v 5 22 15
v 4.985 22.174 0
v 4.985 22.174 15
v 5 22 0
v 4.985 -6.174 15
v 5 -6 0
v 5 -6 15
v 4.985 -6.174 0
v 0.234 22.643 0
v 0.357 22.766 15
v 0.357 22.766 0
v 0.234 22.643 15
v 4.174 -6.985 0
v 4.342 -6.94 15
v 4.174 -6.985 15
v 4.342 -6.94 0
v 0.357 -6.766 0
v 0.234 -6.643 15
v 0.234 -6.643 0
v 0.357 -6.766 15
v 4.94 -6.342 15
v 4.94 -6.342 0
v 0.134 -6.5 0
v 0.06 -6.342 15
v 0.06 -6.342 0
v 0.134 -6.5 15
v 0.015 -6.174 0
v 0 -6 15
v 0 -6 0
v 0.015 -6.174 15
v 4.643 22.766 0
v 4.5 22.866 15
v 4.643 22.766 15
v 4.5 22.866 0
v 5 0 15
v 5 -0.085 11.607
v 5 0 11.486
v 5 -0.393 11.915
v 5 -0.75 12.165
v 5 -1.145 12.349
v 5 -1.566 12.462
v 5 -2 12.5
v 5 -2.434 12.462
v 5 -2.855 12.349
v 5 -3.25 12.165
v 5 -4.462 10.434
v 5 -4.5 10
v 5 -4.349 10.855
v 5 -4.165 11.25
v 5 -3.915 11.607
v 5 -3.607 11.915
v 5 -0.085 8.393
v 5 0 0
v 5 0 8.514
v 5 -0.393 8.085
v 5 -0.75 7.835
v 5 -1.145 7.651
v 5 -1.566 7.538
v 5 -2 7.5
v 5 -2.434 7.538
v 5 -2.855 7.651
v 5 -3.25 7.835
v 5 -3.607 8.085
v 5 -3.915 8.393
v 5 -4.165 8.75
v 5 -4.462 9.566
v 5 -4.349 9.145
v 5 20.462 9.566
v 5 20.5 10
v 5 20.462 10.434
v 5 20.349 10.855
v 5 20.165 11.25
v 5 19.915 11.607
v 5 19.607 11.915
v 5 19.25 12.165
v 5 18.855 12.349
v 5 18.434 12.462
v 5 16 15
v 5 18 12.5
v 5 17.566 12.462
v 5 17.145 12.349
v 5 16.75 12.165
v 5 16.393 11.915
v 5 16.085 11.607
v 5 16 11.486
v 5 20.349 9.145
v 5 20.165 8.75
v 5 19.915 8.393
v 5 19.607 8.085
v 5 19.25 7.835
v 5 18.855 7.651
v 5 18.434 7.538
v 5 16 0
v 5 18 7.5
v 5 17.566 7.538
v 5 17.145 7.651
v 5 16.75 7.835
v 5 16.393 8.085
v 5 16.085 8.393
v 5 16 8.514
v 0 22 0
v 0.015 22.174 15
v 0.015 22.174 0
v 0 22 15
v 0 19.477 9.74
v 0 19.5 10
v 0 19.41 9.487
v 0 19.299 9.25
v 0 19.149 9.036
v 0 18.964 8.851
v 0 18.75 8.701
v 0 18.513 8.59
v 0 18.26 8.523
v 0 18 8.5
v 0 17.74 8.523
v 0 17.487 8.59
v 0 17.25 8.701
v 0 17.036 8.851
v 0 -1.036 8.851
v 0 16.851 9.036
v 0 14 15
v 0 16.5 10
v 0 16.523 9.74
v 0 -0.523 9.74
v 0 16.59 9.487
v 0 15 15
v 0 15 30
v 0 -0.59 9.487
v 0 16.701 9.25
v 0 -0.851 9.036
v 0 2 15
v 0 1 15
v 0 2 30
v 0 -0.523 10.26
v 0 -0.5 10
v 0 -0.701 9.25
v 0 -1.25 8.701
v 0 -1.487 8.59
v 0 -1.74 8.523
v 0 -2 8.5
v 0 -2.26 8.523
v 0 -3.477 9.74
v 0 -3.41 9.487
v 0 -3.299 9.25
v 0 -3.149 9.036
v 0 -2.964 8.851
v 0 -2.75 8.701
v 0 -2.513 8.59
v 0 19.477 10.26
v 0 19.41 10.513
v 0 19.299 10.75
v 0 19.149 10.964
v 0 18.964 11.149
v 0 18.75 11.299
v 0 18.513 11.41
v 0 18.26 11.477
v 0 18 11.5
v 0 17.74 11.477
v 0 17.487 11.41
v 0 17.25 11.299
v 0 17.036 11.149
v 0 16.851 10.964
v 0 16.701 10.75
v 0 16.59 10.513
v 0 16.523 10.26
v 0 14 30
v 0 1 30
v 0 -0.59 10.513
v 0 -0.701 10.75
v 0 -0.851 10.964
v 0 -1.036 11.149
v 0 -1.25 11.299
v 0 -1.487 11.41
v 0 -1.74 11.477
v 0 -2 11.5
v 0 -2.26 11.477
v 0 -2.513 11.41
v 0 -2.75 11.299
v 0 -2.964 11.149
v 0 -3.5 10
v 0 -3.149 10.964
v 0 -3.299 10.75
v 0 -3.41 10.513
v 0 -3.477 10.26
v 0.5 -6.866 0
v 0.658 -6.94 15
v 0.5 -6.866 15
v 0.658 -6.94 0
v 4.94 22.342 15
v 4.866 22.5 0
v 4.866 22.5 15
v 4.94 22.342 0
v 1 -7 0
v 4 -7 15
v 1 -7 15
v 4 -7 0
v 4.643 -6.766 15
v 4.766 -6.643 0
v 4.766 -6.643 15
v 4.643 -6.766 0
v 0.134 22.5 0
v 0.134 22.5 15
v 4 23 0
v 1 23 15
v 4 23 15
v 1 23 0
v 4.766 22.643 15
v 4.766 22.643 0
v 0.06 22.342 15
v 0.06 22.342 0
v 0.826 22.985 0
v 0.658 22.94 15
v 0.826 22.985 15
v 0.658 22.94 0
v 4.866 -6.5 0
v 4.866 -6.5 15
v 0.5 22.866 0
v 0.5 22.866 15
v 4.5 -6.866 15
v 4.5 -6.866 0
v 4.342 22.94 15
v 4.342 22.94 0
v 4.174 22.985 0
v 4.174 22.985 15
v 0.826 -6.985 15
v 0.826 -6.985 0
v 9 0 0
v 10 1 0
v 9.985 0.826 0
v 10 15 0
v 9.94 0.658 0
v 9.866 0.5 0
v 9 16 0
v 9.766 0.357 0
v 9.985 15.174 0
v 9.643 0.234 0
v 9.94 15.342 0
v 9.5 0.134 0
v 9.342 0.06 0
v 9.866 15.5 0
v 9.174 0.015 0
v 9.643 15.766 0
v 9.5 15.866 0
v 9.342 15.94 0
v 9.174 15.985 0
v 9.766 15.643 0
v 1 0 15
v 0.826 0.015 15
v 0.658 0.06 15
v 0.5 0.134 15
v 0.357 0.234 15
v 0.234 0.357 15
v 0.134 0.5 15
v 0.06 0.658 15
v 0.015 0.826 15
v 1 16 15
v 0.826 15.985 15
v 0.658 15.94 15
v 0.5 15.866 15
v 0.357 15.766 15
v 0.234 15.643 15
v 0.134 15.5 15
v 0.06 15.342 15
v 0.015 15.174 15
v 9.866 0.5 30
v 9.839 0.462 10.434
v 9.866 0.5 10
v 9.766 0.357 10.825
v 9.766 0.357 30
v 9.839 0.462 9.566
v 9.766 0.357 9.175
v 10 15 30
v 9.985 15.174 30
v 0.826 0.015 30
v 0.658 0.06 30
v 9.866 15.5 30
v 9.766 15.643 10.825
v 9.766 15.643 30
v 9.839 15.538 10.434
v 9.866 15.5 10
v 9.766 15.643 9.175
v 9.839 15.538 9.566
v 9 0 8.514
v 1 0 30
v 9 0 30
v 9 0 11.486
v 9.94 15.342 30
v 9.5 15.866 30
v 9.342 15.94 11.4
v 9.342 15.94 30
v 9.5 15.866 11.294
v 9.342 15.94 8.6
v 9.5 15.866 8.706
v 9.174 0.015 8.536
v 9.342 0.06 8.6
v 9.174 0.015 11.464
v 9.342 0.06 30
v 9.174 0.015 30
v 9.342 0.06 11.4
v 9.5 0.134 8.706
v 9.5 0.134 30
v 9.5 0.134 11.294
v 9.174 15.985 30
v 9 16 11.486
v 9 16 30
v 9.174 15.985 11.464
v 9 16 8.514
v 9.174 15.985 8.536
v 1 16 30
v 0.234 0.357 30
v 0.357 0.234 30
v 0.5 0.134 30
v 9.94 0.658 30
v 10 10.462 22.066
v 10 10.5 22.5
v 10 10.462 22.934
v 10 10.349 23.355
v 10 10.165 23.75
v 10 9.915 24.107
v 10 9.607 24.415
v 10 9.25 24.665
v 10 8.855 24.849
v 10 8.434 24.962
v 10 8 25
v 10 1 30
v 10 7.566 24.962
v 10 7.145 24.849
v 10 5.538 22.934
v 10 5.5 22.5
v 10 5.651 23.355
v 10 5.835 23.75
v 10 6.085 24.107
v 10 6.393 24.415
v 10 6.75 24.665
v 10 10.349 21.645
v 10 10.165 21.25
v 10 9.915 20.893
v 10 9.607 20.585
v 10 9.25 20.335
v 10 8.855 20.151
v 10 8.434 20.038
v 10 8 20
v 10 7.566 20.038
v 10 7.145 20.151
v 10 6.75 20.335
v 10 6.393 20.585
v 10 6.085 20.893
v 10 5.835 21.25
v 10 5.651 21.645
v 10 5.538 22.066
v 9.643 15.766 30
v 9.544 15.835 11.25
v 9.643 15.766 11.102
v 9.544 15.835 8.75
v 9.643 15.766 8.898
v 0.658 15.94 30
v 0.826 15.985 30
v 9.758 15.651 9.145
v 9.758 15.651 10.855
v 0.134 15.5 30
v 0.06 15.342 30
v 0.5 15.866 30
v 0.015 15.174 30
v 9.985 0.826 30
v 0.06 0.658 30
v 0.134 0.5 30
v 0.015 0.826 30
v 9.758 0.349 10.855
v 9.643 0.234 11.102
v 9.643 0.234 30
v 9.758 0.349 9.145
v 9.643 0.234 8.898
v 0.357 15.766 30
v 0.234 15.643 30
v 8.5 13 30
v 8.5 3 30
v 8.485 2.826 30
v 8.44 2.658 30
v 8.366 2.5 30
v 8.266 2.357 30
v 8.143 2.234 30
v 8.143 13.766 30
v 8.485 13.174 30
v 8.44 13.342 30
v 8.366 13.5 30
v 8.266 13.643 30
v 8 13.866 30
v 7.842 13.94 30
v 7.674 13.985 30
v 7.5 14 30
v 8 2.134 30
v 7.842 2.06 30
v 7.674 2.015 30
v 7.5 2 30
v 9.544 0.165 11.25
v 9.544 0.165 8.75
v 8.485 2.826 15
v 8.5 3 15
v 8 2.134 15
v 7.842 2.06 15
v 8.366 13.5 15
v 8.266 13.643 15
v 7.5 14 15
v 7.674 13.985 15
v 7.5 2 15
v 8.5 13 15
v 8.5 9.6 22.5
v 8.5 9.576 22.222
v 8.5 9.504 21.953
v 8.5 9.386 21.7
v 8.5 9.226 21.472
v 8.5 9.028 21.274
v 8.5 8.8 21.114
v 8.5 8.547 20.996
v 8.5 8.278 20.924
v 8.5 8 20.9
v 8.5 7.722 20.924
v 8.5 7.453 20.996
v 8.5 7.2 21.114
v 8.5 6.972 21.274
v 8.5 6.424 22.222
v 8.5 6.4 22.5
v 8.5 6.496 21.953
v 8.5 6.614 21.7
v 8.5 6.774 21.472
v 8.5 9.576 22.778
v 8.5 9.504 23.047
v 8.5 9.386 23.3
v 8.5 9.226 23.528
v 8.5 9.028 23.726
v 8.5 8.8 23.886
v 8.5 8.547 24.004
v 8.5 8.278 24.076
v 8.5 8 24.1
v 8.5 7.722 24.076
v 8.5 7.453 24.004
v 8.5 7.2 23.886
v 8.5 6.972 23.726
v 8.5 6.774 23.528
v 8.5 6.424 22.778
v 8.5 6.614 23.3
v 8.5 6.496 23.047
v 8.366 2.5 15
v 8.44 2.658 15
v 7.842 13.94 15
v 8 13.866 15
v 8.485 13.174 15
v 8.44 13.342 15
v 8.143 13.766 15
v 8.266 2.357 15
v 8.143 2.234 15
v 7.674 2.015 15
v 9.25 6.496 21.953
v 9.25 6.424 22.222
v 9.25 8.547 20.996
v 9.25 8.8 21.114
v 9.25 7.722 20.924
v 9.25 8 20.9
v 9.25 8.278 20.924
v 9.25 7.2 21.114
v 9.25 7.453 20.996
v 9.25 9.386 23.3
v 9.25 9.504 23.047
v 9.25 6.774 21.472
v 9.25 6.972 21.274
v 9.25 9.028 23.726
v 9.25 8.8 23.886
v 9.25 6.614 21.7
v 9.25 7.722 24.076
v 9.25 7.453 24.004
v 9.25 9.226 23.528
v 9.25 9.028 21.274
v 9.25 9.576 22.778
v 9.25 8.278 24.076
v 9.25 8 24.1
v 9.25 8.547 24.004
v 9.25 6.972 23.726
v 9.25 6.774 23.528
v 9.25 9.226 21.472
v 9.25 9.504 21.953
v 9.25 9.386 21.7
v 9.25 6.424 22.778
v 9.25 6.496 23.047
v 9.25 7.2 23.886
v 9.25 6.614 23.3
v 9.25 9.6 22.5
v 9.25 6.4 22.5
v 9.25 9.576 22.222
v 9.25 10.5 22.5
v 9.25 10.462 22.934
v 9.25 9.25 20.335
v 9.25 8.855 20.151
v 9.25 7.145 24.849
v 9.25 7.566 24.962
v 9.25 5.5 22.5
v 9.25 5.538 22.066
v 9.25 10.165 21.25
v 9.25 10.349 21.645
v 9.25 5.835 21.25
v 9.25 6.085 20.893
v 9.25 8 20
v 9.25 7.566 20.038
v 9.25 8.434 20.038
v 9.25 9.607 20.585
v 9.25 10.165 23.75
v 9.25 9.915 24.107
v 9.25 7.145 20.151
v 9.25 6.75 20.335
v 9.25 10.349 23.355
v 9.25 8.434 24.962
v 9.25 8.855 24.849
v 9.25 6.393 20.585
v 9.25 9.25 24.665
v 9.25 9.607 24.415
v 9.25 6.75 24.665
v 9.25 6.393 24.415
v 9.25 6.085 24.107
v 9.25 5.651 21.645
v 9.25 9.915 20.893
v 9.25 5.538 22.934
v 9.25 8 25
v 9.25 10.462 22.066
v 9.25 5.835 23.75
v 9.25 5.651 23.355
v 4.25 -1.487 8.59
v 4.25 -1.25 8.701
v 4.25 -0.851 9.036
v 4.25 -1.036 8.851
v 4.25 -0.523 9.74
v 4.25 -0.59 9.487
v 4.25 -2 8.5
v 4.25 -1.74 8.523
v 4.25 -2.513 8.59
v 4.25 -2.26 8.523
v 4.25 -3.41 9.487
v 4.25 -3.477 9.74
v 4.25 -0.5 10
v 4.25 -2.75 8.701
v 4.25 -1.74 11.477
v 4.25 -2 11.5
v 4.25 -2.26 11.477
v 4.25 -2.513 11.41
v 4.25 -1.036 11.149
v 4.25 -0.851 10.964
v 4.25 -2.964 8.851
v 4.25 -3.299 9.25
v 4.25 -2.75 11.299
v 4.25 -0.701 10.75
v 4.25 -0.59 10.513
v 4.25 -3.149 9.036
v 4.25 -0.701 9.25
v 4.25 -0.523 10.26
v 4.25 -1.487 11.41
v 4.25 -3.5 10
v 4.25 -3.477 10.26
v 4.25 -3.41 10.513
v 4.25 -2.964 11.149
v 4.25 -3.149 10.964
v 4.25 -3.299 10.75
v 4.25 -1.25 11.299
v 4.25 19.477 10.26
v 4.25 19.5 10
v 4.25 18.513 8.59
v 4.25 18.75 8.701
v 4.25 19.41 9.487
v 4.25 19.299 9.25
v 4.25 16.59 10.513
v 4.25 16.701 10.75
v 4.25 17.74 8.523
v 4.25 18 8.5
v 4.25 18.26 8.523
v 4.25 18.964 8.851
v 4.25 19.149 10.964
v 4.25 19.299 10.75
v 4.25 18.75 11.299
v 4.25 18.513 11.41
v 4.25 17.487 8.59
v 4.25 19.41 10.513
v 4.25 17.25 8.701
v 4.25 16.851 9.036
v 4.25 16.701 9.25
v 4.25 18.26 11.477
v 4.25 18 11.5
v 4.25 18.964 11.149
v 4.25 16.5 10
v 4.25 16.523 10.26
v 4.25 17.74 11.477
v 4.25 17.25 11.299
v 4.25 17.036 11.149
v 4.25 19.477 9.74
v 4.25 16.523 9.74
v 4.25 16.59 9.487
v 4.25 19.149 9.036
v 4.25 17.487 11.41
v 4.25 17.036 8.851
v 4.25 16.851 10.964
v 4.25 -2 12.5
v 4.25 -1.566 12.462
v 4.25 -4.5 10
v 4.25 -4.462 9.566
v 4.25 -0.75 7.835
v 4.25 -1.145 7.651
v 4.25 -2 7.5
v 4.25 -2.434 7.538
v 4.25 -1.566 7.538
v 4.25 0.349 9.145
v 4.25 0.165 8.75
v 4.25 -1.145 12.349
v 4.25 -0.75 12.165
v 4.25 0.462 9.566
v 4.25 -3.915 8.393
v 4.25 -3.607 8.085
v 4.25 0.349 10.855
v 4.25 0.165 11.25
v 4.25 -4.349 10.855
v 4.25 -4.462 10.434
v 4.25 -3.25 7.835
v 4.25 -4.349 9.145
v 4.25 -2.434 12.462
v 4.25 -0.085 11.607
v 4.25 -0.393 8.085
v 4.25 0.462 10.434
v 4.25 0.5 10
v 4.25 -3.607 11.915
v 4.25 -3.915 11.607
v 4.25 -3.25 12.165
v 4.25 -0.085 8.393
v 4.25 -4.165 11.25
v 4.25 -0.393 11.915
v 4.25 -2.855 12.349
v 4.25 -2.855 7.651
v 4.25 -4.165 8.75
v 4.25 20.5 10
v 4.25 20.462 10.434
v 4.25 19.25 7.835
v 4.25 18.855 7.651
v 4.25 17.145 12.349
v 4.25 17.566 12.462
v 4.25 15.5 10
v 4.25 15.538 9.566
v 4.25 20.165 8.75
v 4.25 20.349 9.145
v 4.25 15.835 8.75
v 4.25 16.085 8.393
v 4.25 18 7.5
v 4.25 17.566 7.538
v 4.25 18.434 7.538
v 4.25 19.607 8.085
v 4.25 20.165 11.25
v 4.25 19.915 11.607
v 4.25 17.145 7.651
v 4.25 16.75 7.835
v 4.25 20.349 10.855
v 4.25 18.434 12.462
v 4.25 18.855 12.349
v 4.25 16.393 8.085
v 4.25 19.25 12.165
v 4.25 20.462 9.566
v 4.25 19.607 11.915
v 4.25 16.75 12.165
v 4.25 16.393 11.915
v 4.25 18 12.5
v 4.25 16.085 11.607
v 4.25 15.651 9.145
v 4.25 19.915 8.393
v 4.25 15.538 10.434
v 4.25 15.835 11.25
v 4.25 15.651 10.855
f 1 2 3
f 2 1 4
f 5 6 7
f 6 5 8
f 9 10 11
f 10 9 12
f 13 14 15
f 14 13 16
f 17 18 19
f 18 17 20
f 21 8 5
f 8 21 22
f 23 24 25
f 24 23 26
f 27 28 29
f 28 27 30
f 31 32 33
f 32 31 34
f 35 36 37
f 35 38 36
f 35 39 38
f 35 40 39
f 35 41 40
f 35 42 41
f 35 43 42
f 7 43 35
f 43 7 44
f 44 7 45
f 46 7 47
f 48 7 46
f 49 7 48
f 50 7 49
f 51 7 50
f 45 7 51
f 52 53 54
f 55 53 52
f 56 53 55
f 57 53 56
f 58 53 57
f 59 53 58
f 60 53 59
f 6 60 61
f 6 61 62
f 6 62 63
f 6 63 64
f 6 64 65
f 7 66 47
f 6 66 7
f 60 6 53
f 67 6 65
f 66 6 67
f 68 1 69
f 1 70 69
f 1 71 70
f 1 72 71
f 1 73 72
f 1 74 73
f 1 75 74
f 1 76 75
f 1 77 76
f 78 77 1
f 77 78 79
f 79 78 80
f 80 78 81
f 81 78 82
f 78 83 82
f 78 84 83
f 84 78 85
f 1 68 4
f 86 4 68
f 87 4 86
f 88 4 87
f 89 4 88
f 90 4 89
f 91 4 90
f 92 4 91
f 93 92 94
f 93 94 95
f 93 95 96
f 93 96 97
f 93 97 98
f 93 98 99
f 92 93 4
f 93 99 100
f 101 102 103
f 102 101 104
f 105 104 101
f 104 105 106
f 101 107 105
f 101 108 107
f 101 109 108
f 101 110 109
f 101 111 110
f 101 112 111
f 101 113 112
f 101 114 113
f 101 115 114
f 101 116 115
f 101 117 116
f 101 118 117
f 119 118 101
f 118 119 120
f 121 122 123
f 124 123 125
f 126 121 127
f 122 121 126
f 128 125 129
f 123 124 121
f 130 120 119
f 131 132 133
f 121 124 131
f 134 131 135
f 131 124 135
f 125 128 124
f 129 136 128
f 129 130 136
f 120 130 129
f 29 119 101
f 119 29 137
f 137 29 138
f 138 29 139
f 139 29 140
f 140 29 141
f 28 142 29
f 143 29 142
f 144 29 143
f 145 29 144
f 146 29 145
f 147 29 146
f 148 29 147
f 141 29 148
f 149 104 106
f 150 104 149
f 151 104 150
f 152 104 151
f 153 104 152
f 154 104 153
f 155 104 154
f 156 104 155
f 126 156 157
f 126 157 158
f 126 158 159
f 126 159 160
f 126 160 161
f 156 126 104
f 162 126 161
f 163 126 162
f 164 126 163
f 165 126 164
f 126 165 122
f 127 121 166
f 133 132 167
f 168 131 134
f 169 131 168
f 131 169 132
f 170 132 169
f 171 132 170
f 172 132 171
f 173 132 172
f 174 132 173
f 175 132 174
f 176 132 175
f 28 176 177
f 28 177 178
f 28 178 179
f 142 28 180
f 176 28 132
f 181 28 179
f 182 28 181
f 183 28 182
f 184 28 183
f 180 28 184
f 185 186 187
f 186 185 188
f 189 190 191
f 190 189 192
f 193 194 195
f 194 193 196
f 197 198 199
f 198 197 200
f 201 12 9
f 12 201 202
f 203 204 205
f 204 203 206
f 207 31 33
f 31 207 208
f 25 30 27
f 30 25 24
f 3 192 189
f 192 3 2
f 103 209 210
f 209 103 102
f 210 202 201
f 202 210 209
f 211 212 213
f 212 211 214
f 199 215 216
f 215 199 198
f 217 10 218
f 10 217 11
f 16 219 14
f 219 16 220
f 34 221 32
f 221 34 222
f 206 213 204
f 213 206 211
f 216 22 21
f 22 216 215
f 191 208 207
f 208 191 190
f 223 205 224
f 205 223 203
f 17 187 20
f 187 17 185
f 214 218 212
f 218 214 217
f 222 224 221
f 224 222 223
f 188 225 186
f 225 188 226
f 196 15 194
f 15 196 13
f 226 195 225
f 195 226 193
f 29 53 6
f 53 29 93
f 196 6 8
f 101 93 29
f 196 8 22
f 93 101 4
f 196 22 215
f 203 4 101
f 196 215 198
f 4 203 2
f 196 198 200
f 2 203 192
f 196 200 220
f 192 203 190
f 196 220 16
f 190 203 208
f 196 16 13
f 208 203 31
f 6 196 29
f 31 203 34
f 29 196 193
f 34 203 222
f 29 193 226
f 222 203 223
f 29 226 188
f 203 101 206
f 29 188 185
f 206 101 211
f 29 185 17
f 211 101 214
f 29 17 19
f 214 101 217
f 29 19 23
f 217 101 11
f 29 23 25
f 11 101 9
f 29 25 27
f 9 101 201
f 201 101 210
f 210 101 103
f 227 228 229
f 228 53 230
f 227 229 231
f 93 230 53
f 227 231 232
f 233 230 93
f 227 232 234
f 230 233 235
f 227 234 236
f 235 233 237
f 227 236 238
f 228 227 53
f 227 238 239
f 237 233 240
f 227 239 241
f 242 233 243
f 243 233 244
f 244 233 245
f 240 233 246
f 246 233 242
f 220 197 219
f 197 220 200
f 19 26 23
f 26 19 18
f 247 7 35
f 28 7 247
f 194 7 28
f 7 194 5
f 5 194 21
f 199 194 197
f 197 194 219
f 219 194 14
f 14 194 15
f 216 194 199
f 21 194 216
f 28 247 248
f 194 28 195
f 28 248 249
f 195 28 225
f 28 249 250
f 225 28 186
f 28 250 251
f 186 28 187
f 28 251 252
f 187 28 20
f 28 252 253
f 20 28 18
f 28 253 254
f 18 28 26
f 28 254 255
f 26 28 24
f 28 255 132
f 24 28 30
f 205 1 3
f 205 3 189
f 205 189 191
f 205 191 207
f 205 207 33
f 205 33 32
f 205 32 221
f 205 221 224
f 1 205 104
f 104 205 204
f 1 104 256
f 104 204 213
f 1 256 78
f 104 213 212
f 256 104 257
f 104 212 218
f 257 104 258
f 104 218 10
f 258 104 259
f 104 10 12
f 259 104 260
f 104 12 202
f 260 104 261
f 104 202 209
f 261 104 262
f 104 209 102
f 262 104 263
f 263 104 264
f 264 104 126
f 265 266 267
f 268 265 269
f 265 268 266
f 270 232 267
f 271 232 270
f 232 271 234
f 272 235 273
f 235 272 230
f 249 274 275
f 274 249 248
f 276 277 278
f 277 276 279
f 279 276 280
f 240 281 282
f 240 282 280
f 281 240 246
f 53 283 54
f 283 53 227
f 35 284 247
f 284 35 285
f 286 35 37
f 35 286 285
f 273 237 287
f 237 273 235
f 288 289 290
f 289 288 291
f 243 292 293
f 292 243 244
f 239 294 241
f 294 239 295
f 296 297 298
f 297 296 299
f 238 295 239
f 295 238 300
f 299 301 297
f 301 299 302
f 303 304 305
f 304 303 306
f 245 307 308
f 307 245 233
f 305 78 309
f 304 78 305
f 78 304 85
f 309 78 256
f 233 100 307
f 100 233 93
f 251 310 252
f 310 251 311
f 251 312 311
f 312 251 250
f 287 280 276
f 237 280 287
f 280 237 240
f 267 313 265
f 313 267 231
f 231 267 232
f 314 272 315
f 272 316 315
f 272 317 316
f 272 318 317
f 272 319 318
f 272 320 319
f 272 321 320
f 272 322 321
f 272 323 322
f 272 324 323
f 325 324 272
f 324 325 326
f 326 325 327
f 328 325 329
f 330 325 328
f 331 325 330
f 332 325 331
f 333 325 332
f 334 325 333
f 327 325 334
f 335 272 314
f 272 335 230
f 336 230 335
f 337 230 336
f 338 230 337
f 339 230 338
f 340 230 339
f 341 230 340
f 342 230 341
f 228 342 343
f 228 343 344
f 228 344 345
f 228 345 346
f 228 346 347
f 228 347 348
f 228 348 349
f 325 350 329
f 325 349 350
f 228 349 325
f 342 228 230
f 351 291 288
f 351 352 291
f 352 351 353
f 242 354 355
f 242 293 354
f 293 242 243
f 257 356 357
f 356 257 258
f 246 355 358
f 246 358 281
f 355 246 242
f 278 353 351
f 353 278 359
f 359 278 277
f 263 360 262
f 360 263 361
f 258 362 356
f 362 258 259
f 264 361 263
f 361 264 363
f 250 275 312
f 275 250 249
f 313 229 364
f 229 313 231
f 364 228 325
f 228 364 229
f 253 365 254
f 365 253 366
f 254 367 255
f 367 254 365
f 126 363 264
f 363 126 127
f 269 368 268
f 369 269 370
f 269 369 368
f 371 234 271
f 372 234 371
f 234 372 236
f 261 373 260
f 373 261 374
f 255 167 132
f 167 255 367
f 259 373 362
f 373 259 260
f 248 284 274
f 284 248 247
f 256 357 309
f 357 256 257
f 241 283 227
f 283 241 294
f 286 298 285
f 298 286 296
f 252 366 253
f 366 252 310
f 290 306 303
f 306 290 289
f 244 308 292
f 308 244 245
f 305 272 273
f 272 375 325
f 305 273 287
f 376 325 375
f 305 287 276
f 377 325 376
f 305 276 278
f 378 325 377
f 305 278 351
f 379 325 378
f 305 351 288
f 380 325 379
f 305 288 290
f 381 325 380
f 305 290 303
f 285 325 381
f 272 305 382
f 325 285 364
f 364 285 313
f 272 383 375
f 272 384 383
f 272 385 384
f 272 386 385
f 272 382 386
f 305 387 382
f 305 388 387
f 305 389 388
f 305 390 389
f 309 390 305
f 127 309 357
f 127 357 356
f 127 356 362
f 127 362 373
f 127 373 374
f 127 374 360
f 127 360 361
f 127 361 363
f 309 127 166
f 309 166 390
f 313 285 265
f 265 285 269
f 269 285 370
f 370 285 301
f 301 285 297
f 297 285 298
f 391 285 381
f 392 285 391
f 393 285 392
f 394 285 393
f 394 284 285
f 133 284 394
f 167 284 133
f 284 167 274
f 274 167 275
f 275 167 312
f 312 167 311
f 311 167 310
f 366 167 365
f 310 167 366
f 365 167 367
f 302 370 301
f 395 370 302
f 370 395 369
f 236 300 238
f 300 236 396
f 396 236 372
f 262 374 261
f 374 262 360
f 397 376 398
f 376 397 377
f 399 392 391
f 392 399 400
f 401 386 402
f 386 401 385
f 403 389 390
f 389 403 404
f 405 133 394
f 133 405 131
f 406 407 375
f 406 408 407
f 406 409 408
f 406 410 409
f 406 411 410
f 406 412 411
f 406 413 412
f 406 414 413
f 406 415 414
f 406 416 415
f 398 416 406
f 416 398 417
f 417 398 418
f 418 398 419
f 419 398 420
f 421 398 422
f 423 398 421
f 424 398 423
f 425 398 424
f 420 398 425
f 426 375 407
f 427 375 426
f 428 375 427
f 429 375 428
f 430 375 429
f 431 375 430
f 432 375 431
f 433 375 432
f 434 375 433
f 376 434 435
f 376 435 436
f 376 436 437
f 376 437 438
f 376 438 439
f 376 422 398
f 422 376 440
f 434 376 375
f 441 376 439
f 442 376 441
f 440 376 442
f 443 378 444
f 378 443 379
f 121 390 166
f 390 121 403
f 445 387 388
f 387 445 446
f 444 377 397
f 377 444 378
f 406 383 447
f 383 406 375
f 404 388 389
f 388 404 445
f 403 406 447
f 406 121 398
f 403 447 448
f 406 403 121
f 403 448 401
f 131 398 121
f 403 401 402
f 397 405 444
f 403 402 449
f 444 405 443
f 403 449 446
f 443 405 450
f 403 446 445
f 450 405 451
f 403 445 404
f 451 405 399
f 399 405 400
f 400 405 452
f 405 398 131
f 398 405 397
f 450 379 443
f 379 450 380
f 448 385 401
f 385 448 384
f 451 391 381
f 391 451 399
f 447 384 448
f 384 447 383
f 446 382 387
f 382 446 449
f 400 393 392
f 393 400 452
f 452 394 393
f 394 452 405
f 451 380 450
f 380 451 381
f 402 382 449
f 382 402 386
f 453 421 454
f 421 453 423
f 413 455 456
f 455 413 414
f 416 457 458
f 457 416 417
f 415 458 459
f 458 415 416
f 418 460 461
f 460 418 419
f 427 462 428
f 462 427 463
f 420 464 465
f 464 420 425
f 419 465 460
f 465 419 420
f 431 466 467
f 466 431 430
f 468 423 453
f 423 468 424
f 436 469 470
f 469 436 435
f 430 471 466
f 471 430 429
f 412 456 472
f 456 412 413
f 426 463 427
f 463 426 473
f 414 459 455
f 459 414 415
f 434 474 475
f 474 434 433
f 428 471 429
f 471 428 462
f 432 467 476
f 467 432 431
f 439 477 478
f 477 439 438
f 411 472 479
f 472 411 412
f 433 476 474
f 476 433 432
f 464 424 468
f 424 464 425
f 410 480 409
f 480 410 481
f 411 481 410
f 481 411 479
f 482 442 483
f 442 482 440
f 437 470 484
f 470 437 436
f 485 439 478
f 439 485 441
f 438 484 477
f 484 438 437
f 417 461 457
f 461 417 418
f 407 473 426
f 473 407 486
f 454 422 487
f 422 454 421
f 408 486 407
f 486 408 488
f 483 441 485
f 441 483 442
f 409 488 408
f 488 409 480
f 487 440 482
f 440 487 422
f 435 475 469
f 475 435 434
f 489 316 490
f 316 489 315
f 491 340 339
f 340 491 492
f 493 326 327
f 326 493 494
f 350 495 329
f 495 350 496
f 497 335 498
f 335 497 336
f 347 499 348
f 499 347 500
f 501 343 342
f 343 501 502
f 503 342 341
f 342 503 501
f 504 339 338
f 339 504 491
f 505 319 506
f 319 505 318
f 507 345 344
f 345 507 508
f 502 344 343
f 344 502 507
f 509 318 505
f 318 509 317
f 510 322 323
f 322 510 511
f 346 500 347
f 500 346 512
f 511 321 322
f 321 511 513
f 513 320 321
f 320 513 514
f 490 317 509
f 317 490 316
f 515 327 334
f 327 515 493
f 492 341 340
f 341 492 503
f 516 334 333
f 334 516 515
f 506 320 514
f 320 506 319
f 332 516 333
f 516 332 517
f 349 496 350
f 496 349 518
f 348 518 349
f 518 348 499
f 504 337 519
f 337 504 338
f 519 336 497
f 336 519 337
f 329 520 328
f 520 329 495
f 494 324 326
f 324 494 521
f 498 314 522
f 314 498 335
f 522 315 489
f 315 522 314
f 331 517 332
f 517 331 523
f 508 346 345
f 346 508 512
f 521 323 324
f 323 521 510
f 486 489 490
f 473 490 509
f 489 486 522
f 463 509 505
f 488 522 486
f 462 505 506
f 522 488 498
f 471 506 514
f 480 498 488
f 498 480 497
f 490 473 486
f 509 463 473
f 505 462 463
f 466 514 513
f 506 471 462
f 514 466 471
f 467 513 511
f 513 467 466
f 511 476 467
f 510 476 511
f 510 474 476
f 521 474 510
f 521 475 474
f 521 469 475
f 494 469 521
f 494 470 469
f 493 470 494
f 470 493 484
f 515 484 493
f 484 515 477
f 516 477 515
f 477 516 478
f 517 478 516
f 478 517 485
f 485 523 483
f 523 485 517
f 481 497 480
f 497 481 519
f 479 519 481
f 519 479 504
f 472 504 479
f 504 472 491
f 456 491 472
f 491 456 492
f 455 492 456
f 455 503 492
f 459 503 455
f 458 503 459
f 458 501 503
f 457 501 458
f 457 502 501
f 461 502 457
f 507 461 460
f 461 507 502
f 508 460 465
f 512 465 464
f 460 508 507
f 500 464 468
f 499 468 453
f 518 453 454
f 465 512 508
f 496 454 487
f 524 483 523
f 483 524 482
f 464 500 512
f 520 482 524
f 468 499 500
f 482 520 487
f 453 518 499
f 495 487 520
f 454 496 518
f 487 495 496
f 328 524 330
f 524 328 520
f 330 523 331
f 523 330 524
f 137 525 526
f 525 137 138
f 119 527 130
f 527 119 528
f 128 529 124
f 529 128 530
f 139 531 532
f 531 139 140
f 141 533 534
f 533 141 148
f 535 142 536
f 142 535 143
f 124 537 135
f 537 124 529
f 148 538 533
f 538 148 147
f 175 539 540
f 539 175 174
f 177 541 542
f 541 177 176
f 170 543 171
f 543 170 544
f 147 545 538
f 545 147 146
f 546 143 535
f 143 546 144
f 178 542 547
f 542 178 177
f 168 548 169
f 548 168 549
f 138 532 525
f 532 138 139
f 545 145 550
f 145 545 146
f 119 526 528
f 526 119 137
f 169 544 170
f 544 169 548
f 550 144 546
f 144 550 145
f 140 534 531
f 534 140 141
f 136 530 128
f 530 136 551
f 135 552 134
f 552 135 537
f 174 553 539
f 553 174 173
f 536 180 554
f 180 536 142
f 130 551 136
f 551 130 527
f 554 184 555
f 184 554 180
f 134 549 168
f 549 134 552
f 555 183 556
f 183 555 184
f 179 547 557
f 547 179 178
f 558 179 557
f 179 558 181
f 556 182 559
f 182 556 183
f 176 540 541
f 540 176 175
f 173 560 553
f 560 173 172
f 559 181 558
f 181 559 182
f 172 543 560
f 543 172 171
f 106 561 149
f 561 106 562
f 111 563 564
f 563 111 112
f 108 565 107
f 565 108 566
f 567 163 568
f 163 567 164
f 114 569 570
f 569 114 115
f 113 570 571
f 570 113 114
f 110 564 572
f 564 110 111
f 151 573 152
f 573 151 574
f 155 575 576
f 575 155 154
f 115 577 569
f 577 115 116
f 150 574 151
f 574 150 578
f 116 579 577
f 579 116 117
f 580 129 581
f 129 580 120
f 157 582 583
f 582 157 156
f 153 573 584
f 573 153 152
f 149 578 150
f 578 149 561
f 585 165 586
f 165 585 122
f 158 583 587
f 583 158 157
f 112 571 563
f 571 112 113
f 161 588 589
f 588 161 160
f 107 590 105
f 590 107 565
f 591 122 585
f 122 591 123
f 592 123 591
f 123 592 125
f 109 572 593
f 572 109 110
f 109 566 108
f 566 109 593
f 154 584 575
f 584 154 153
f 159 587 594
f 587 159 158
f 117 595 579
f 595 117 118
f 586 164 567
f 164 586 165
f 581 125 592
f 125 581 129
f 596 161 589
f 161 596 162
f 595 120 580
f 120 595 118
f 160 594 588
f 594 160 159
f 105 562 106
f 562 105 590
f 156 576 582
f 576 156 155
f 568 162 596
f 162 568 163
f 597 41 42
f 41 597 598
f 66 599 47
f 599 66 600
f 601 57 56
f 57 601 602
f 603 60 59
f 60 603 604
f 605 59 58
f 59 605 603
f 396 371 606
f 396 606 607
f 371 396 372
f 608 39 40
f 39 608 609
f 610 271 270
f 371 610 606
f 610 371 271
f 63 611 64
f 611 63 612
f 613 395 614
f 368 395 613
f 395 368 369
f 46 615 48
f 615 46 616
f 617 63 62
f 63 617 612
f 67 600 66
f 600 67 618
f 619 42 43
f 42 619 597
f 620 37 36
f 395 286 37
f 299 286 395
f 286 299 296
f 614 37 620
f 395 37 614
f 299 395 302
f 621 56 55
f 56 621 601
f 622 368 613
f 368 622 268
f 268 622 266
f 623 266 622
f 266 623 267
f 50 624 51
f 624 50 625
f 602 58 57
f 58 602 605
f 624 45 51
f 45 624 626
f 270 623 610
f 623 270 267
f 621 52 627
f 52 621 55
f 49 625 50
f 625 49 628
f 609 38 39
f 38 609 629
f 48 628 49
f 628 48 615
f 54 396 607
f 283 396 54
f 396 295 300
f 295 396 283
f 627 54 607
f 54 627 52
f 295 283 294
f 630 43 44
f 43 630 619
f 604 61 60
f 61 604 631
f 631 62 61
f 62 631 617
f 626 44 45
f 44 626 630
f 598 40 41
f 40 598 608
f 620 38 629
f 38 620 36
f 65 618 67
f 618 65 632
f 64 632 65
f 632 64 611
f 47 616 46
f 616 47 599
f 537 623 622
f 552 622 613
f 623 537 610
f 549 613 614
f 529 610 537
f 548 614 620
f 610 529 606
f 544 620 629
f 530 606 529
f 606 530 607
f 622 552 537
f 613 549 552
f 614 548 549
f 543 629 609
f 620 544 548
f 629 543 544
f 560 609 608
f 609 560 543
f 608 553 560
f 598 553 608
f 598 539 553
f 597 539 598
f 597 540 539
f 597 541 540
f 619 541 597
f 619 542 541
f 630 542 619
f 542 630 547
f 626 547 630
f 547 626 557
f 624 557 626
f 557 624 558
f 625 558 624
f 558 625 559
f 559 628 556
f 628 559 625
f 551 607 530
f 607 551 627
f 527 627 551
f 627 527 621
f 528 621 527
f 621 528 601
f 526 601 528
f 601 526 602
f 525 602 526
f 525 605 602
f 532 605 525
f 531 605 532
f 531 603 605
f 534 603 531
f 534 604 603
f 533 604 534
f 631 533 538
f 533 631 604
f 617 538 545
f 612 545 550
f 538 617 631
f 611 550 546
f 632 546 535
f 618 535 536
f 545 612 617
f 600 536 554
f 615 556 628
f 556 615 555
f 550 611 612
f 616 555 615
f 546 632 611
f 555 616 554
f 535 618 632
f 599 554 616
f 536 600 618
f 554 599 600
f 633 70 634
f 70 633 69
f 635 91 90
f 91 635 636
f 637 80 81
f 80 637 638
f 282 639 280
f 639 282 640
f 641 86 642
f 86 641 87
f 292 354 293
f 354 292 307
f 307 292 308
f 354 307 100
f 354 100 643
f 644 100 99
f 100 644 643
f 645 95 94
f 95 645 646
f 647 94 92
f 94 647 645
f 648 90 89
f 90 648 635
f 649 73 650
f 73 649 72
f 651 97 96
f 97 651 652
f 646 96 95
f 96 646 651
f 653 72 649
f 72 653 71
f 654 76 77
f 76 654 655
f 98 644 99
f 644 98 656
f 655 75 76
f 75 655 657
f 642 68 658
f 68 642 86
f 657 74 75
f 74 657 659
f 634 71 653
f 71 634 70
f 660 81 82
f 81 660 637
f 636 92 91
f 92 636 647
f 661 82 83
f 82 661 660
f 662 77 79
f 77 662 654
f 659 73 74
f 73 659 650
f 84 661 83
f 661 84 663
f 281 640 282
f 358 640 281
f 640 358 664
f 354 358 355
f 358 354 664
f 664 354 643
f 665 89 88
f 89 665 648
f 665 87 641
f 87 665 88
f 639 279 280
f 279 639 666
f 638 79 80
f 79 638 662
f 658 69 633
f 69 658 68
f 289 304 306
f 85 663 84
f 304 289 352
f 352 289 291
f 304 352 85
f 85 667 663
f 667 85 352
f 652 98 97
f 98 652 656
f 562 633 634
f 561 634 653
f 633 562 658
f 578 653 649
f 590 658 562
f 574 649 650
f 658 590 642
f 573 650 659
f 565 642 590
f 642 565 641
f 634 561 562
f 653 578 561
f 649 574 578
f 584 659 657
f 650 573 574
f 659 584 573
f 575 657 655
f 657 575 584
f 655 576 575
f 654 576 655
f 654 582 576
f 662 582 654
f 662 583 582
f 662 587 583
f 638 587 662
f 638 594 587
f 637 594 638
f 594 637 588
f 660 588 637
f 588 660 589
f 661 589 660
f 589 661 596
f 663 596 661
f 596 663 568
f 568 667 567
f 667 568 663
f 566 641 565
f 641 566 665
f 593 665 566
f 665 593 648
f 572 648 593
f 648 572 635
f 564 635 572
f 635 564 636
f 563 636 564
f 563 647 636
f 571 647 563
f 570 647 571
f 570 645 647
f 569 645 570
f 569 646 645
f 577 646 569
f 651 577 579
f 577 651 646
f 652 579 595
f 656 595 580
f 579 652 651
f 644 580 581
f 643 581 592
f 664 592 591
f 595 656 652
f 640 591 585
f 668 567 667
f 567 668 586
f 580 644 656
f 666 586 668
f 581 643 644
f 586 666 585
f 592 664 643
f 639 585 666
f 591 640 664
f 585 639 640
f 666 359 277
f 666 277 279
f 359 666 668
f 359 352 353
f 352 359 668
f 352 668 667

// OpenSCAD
/*
 * Tidegrow Pillar-Port Mount
 * Copyright (c) 2022 Lone Dynamics Corporation. All rights reserved.
 *
 */ 

$fn = 36;

pillar_mount();
 
module pillar_mount() {
	
	p_height = 30;
	p_width = 16;
	p_depth = 10;
	p_roundness = 1;

	pn_height = 15;
	pn_width = 12;
	pn_depth = 8;
	pn_roundness = 1;
	
	pp_height = 15;
	pp_width = 30;
	pp_depth = 5;
	pp_roundness = 1;
	
	pl_height = 0;
		
	difference() {
		
		union () {
					
			translate([0,(p_width/2)-(pp_width/2),0])
				roundedcube(pp_depth, pp_width, p_height-pn_height, pp_roundness);

			translate([0,0,0])
				roundedcube(p_depth, p_width, p_height+pl_height, pn_roundness);
		
		}
		
		translate([-1,(p_width/2)-(pn_width/2),p_height-pn_height+pl_height])
			roundedcube(1.5+pn_depth, pn_width, pn_height, pn_roundness);
		
		// top bolt hole
		translate([0,(p_width/2),p_height-(pn_height/2)+pl_height])
			rotate([0,90,0])
				cylinder(d=3.2, h=10);

		// top countersink
		translate([p_depth-0.75,(p_width/2),p_height-(pn_height/2)+pl_height])
			rotate([0,90,0])
				cylinder(d=5, h=10);
			
		// port bolt holes
		translate([-1,(p_width/2)-10,pn_height-5])
			rotate([0,90,0])
				cylinder(d=3, h=20);
			
		translate([-1,(p_width/2)+10,pn_height-5])
			rotate([0,90,0])
				cylinder(d=3, h=20);
				
		// port countersinks
		translate([pp_depth-0.75,(p_width/2)-10,pn_height-5])
			rotate([0,90,0])
				cylinder(d=5, h=10);
				
		translate([pp_depth-0.75,(p_width/2)+10,pn_height-5])
			rotate([0,90,0])
				cylinder(d=5, h=10);

	}
	
}

// https://gist.github.com/tinkerology/ae257c5340a33ee2f149ff3ae97d9826
module roundedcube(xx, yy, height, radius)
{
    translate([0,0,height/2])
    hull()
    {
        translate([radius,radius,0])
        cylinder(height,radius,radius,true);

        translate([xx-radius,radius,0])
        cylinder(height,radius,radius,true);

        translate([xx-radius,yy-radius,0])
        cylinder(height,radius,radius,true);

        translate([radius,yy-radius,0])
        cylinder(height,radius,radius,true);
    }
}
